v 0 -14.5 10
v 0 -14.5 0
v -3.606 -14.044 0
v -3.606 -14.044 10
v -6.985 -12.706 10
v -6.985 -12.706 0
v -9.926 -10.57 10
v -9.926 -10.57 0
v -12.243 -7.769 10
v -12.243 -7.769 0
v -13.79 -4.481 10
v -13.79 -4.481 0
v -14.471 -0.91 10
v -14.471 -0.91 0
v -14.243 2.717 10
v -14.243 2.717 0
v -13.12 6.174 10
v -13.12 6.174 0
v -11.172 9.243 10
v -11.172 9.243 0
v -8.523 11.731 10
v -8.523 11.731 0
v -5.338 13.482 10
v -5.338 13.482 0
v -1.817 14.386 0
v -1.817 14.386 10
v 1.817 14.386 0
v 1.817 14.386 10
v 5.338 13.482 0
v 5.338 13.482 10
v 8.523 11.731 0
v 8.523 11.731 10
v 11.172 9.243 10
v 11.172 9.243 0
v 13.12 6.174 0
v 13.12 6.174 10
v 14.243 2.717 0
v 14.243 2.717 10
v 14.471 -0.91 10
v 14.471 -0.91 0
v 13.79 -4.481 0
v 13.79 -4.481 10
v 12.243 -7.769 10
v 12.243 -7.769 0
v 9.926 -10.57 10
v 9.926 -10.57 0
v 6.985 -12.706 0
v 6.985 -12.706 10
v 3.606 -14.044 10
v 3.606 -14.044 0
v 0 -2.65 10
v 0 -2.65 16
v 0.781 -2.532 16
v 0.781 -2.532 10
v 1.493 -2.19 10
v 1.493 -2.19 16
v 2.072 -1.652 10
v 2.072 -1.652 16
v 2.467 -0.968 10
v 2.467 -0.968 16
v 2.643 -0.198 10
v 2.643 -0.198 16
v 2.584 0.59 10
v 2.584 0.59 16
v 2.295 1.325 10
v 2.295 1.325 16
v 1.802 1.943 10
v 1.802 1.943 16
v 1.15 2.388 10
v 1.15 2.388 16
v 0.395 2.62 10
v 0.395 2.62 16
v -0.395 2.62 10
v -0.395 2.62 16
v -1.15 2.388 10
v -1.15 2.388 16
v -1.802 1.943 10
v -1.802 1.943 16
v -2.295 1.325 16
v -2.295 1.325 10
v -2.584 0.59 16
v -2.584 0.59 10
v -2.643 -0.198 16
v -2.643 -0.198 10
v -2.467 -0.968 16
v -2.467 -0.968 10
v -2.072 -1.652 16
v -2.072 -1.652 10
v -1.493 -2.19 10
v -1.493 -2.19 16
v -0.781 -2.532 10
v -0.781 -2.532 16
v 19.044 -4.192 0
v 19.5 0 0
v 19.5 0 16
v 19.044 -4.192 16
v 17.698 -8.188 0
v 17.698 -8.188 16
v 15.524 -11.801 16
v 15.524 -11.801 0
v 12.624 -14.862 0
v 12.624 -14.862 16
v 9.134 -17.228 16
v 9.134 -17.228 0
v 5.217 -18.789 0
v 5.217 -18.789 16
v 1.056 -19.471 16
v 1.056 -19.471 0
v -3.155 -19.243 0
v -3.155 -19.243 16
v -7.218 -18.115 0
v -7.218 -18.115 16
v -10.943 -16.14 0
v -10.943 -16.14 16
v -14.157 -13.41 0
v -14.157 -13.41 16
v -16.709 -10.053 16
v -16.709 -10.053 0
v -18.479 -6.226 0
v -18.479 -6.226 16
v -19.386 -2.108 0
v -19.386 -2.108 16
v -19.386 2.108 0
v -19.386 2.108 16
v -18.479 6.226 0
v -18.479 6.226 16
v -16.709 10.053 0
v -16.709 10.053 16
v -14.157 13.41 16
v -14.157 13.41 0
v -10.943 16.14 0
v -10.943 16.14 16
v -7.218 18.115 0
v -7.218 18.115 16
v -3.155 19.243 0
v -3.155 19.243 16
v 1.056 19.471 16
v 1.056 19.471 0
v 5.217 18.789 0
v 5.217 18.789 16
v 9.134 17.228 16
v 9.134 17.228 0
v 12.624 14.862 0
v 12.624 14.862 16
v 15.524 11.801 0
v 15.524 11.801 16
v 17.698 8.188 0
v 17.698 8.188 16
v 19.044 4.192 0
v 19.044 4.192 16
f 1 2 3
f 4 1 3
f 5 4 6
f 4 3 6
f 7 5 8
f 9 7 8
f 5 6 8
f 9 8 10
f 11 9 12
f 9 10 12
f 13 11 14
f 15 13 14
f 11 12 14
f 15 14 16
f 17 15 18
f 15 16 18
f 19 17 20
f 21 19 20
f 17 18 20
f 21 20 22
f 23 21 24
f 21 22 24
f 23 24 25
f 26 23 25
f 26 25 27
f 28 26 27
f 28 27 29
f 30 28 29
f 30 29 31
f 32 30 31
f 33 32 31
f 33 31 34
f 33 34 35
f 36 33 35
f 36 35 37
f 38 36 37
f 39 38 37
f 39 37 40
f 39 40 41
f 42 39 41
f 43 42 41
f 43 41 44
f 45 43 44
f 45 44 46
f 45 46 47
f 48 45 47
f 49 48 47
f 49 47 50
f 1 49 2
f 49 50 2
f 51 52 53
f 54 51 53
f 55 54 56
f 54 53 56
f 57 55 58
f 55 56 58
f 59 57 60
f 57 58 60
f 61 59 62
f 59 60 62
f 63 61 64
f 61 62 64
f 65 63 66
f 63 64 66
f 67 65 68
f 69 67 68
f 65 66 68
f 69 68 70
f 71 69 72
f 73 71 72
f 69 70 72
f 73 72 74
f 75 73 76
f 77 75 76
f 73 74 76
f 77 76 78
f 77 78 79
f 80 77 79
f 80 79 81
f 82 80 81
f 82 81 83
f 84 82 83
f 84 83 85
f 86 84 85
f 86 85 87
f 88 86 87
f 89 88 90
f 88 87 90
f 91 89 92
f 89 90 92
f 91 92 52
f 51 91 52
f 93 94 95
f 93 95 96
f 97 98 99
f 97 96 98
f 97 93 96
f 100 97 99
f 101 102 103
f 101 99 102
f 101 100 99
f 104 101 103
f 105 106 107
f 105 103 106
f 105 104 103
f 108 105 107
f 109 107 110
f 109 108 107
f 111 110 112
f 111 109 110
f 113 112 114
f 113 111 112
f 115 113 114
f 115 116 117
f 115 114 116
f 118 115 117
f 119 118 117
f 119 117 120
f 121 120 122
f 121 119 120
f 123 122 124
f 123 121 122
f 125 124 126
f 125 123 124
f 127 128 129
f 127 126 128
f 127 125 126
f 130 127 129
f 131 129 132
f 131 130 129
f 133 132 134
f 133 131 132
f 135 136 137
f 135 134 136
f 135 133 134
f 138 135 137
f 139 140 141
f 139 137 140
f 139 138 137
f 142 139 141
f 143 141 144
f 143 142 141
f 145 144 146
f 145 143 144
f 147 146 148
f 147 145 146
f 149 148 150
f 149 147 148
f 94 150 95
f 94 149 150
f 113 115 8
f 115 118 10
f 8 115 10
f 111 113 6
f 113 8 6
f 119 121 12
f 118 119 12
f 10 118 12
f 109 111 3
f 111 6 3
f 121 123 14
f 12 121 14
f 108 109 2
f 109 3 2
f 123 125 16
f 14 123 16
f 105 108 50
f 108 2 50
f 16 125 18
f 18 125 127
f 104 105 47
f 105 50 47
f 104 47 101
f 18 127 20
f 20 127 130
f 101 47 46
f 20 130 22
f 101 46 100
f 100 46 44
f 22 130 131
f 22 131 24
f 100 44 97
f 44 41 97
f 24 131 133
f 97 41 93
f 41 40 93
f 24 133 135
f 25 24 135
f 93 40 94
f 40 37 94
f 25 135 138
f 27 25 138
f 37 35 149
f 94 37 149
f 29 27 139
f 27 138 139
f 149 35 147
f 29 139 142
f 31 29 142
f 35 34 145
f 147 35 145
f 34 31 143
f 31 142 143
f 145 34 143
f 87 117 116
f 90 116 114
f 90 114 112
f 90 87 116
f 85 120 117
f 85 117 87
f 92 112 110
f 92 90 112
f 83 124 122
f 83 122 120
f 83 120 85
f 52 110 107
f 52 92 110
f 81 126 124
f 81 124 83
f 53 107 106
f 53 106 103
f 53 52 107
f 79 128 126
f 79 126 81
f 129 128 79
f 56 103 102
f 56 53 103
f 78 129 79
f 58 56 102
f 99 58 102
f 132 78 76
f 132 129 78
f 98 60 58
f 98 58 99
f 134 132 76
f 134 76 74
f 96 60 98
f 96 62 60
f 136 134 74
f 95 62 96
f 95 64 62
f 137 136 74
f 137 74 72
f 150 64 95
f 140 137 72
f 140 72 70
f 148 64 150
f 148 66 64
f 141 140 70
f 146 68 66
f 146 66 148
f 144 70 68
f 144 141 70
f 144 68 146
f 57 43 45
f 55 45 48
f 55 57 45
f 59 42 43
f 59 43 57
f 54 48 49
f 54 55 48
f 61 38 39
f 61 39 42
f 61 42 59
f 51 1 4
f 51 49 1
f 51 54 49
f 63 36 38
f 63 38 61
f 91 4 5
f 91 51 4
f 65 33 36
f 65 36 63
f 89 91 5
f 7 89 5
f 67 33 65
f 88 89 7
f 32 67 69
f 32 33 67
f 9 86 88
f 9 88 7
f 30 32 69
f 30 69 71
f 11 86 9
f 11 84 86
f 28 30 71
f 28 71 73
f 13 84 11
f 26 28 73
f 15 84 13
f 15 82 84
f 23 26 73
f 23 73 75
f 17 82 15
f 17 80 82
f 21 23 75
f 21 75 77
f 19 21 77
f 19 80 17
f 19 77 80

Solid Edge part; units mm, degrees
sketch "Sketch1" plane through (0, 0, 0) normal (0, 0, 1) x (1, 0, 0)
  circle A0 centre (0, 0) radius 19.5
extrude "Protrusion1" add sketch "Sketch1" along normal blind 16
sketch "Sketch2" plane through (0, 0, 0) normal (0, 0, -1) x (0, -1, 0)
  circle A0 centre (0, 0) radius 14.5
  dimension "D1" = 29
extrude "Cutout1" cut sketch "Sketch2" against normal blind 10
hole "Bohrung_1" at (0, 0, 16) direction (0, 0, -1) diameter 5.3 end up to next
